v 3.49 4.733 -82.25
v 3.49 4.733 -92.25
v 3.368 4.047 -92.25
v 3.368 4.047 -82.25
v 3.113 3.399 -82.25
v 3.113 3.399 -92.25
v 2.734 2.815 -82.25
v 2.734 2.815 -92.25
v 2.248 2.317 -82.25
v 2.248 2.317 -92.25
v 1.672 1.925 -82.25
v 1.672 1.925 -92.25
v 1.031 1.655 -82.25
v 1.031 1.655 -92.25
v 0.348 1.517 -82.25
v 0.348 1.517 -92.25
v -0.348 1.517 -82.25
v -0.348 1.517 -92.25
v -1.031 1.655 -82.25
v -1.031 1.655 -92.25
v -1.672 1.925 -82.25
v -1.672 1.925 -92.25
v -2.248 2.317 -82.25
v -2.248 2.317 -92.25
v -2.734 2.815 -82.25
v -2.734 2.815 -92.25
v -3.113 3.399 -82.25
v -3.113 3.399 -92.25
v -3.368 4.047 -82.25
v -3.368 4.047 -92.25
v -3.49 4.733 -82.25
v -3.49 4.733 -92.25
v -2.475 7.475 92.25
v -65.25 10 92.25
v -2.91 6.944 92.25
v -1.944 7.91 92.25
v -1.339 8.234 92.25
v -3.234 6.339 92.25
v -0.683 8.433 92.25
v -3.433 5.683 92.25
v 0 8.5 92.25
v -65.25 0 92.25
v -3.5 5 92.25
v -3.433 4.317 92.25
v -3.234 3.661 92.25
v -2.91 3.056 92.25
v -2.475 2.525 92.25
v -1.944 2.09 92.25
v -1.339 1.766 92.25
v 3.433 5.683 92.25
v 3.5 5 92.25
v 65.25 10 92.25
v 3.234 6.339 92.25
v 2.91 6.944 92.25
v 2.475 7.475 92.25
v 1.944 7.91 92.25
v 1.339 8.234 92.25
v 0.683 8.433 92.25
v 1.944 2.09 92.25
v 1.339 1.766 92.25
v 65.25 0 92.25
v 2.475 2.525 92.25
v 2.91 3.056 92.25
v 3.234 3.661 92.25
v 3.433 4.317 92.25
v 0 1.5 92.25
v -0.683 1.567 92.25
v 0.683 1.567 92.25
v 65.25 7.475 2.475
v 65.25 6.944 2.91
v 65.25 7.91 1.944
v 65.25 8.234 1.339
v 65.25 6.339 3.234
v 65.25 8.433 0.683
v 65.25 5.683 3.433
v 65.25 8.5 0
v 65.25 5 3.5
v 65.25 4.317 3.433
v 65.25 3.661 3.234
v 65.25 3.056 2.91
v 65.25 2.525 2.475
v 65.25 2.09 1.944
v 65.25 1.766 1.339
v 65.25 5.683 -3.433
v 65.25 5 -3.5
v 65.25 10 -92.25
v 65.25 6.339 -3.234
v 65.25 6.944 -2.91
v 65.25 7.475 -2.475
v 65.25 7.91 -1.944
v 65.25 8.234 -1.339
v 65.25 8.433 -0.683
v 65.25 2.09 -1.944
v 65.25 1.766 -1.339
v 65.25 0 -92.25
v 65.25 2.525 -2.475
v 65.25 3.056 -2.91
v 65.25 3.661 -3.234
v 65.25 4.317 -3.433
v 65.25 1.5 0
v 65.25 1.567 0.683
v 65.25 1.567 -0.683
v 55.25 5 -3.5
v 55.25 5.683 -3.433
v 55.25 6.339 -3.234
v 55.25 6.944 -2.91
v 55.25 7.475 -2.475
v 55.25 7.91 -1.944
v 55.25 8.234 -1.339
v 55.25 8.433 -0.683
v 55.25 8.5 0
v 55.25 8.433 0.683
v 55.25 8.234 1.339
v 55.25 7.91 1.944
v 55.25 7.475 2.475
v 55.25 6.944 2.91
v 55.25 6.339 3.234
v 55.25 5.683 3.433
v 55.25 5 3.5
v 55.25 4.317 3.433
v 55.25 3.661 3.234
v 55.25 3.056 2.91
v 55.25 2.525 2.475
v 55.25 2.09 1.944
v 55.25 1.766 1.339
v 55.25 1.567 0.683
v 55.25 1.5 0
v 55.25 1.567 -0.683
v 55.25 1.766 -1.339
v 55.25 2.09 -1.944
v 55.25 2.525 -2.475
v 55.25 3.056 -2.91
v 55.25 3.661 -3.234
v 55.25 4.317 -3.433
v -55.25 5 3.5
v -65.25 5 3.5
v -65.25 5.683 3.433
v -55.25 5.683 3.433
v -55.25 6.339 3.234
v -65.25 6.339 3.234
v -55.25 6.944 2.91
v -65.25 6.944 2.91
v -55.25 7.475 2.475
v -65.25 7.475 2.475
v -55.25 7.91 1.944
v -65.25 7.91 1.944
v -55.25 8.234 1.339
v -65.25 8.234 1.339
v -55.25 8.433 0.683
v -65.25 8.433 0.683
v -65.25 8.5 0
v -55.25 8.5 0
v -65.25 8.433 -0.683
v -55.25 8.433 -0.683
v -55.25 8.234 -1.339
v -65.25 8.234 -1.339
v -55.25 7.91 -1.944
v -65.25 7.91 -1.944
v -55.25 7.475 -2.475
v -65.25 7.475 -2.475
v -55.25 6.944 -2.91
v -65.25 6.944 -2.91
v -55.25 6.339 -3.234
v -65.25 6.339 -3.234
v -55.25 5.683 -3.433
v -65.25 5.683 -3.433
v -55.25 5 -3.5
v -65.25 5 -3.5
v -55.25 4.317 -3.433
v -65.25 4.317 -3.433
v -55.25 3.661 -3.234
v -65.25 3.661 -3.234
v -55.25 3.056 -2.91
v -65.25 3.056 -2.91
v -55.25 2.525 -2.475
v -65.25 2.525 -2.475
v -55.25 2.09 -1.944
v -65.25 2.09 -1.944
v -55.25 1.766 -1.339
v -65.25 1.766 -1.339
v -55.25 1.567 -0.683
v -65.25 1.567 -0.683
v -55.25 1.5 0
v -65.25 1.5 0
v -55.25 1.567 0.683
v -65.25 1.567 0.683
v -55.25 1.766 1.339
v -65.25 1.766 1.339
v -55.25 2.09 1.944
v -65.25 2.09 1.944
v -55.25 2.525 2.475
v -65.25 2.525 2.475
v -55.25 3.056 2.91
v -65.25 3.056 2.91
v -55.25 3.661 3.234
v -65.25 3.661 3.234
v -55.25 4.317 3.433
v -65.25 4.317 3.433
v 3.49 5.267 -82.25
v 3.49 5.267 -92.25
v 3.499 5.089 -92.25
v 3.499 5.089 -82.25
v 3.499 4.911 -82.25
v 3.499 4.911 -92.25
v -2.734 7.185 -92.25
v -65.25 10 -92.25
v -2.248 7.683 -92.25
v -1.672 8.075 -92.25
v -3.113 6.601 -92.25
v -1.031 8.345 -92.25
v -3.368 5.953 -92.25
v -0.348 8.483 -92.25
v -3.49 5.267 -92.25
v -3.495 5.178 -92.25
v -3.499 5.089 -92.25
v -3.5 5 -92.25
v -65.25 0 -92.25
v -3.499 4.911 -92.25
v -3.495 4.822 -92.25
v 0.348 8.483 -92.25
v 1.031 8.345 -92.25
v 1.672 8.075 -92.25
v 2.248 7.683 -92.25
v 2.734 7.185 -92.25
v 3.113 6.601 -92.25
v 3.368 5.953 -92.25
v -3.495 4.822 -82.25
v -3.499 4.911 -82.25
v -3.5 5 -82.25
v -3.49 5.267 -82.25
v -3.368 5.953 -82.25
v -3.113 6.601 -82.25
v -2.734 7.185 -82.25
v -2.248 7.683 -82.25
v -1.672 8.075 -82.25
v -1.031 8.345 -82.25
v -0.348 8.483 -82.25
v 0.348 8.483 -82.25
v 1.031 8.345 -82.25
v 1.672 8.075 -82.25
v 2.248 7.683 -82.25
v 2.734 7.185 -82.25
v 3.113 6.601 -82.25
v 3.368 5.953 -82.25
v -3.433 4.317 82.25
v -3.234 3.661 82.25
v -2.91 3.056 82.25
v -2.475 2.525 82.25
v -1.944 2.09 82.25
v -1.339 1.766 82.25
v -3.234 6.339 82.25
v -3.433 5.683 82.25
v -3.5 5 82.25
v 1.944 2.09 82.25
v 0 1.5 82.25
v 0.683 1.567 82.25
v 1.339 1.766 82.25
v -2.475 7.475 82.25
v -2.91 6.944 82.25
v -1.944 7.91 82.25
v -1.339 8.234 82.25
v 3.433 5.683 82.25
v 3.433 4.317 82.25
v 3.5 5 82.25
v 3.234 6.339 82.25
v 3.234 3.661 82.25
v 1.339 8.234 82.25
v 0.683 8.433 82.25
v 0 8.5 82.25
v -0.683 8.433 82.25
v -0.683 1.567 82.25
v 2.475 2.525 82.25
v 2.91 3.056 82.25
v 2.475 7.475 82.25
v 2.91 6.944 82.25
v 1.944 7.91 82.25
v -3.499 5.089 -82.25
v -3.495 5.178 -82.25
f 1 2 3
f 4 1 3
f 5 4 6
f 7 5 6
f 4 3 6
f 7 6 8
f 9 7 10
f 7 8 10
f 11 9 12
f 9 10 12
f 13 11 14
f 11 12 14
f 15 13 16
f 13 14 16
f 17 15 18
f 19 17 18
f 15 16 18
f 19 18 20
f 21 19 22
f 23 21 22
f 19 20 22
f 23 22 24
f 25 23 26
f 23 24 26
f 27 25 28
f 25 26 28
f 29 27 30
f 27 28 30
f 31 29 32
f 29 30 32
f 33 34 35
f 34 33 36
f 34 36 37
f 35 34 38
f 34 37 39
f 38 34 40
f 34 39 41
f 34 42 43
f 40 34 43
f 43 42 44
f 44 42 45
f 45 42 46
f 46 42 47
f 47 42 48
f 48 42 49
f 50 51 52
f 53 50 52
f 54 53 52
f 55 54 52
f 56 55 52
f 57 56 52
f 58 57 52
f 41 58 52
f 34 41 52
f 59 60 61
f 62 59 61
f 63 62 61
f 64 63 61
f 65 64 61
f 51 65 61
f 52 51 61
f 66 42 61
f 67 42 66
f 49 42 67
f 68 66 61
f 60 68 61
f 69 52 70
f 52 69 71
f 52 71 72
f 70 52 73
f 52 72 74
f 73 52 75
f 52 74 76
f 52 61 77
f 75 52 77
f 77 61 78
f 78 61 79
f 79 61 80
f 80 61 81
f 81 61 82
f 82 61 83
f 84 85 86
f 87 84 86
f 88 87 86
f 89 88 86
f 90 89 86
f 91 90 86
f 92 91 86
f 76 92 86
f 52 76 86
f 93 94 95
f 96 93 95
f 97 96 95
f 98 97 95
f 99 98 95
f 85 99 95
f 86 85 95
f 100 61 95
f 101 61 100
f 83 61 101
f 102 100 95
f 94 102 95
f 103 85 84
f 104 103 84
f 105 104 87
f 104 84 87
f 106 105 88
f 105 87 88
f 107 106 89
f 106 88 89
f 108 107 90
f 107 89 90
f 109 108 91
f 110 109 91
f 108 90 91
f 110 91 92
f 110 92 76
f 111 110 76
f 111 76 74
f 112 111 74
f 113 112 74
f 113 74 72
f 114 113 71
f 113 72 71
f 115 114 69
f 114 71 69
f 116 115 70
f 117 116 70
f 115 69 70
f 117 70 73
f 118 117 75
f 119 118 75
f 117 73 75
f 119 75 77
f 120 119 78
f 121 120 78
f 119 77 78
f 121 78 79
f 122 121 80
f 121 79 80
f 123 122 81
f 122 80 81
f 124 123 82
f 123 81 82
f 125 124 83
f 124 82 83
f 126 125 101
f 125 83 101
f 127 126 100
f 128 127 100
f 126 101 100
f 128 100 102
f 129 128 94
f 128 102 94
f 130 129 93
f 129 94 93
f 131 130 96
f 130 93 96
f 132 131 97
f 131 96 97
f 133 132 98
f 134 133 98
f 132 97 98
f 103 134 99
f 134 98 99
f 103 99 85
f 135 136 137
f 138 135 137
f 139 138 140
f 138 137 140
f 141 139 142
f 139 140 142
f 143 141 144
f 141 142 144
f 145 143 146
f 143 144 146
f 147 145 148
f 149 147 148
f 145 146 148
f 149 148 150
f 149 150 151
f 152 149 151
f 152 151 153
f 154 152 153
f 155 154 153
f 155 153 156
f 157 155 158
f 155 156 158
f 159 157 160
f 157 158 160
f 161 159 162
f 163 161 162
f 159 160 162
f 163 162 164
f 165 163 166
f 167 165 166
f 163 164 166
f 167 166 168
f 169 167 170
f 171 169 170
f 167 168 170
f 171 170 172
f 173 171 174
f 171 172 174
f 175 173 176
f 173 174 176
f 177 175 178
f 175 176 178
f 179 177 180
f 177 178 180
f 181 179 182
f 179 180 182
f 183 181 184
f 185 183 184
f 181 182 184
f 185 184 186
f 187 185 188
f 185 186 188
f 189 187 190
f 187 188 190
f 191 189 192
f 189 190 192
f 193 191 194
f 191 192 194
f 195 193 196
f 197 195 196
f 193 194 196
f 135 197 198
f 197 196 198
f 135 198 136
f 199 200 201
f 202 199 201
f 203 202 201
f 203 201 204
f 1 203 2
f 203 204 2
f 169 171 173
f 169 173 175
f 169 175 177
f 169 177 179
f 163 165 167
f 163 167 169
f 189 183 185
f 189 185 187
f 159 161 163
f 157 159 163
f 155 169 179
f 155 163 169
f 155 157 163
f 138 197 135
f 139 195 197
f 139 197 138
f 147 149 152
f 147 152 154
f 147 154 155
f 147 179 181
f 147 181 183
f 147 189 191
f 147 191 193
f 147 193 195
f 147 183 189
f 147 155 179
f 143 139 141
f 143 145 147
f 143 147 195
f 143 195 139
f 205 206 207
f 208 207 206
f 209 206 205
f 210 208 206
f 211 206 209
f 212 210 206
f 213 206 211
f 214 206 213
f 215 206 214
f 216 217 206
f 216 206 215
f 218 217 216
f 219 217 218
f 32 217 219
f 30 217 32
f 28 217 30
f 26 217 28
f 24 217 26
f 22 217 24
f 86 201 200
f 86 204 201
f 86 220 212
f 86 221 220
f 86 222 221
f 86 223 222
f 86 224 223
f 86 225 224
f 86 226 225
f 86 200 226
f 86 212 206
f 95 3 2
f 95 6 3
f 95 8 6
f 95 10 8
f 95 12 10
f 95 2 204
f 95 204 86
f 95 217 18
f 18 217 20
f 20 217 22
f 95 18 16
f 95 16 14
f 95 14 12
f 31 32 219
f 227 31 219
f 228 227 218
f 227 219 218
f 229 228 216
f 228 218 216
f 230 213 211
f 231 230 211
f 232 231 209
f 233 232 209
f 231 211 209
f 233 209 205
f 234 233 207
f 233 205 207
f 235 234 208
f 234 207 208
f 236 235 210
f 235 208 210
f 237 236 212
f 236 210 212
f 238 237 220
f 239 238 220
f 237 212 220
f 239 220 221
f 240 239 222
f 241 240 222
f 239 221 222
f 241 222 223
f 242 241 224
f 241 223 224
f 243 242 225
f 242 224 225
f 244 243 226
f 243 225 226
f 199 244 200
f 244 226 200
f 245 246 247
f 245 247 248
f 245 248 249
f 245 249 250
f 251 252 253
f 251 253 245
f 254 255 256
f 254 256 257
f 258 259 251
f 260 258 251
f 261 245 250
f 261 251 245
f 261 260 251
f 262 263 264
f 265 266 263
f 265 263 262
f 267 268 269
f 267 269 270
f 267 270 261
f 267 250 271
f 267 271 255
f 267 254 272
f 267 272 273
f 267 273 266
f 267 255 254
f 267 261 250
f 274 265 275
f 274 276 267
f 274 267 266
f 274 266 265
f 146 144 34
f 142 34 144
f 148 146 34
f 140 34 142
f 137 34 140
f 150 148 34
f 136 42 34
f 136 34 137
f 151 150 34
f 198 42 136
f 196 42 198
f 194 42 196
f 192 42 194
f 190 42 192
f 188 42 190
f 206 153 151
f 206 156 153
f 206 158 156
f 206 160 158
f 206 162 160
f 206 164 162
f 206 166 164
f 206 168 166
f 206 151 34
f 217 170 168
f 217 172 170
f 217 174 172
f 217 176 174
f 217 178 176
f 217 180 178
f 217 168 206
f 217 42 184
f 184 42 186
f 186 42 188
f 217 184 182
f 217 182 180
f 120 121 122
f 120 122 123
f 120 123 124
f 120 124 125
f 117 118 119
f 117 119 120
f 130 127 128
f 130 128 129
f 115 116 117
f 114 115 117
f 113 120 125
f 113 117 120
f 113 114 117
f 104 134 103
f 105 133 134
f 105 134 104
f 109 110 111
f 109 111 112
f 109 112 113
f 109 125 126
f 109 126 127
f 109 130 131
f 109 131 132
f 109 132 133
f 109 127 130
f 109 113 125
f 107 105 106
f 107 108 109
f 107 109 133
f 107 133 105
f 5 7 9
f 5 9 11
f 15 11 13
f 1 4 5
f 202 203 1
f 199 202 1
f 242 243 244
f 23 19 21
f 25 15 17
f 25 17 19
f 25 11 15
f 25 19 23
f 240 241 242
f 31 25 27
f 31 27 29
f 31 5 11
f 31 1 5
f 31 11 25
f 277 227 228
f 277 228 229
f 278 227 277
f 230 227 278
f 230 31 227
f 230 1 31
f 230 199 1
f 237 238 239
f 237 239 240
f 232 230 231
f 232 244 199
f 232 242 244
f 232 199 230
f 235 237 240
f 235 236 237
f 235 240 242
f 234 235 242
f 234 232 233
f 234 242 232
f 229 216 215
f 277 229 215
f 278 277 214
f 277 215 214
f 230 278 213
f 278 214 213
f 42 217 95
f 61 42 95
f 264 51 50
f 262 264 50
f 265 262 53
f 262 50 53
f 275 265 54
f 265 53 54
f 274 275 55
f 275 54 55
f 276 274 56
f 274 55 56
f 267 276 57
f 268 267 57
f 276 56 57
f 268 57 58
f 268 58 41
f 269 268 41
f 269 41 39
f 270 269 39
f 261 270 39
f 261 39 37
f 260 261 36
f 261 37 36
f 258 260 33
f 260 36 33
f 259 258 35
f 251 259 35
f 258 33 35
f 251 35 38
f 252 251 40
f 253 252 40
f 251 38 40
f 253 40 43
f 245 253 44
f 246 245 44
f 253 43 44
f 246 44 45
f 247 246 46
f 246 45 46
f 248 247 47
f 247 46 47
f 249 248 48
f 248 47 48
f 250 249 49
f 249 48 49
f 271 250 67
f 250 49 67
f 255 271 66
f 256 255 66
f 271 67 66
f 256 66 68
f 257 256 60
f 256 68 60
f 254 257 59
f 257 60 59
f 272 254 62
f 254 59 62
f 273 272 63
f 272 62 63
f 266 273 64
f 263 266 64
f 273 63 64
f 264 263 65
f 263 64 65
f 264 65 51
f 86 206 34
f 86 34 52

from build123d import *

# Parameters (mm, degrees)
SKETCH_1_W          = 130.5
SKETCH_1_H          = 184.5
EXTRUDE_1_DEPTH     = 10
SKETCH_2_R          = 3.5
CUT_EXTRUDE_1_DEPTH = 10
SKETCH_3_R          = 3.5
CUT_EXTRUDE_2_DEPTH = 10
CUT_EXTRUDE_3_DEPTH = 10
SKETCH_5_R          = 3.5
CUT_EXTRUDE_4_DEPTH = 10


with BuildPart() as part:
    # 草图1 → 凸台-拉伸1 (new body)
    with BuildSketch(Plane(origin=(0, 0, 0), x_dir=(1, 0, 0), z_dir=(0, 1, 0))):
        Rectangle(SKETCH_1_W, SKETCH_1_H)
    extrude(amount=EXTRUDE_1_DEPTH)

    # 草图2 → 切除-拉伸1 (cut)
    with BuildSketch(Plane.XY.offset(92.25)):
        with Locations((0, 5)):
            Circle(SKETCH_2_R)
    extrude(amount=-CUT_EXTRUDE_1_DEPTH, mode=Mode.SUBTRACT)

    # 草图3 → 切除-拉伸2 (cut)
    with BuildSketch(Plane(origin=(65.25, 0, 0), x_dir=(0, 0, -1), z_dir=(1, 0, 0))):
        with Locations((0, 5)):
            Circle(SKETCH_3_R)
    extrude(amount=-CUT_EXTRUDE_2_DEPTH, mode=Mode.SUBTRACT)

    # 草图4 → 切除-拉伸3 (cut)
    with BuildSketch(Plane(origin=(0, 0, -92.25), x_dir=(-1, 0, 0), z_dir=(0, 0, -1))):
        with BuildLine():
            ThreePointArc((3.489769201, 5.267415264), (0, 8.5), (-3.489769201, 5.267415264))
            Line((-3.489769201, 5.267415264), (0, 5))
            Line((0, 5), (3.489769201, 5.267415264))
        make_face()
        with BuildLine():
            Line((0, 5), (-3.489769201, 5.267415264))
            ThreePointArc((-3.489769201, 5.267415264), (-3.5, 5), (-3.489769201, 4.732584736))
            Line((-3.489769201, 4.732584736), (0, 5))
        make_face()
        with BuildLine():
            Line((3.489769201, 5.267415264), (0, 5))
            Line((0, 5), (3.489769201, 4.732584736))
            ThreePointArc((3.489769201, 4.732584736), (3.497441365, 4.866194551), (3.5, 5))
            ThreePointArc((3.5, 5), (3.497441365, 5.133805449), (3.489769201, 5.267415264))
        make_face()
        with BuildLine():
            Line((3.489769201, 4.732584736), (0, 5))
            Line((0, 5), (-3.489769201, 4.732584736))
            ThreePointArc((-3.489769201, 4.732584736), (0, 1.5), (3.489769201, 4.732584736))
        make_face()
    extrude(amount=-CUT_EXTRUDE_3_DEPTH, mode=Mode.SUBTRACT)

    # 草图5 → 切除-拉伸4 (cut)
    with BuildSketch(Plane.ZY.offset(65.25)):
        with Locations((0, 5)):
            Circle(SKETCH_5_R)
    extrude(amount=-CUT_EXTRUDE_4_DEPTH, mode=Mode.SUBTRACT)


solid = part.part
